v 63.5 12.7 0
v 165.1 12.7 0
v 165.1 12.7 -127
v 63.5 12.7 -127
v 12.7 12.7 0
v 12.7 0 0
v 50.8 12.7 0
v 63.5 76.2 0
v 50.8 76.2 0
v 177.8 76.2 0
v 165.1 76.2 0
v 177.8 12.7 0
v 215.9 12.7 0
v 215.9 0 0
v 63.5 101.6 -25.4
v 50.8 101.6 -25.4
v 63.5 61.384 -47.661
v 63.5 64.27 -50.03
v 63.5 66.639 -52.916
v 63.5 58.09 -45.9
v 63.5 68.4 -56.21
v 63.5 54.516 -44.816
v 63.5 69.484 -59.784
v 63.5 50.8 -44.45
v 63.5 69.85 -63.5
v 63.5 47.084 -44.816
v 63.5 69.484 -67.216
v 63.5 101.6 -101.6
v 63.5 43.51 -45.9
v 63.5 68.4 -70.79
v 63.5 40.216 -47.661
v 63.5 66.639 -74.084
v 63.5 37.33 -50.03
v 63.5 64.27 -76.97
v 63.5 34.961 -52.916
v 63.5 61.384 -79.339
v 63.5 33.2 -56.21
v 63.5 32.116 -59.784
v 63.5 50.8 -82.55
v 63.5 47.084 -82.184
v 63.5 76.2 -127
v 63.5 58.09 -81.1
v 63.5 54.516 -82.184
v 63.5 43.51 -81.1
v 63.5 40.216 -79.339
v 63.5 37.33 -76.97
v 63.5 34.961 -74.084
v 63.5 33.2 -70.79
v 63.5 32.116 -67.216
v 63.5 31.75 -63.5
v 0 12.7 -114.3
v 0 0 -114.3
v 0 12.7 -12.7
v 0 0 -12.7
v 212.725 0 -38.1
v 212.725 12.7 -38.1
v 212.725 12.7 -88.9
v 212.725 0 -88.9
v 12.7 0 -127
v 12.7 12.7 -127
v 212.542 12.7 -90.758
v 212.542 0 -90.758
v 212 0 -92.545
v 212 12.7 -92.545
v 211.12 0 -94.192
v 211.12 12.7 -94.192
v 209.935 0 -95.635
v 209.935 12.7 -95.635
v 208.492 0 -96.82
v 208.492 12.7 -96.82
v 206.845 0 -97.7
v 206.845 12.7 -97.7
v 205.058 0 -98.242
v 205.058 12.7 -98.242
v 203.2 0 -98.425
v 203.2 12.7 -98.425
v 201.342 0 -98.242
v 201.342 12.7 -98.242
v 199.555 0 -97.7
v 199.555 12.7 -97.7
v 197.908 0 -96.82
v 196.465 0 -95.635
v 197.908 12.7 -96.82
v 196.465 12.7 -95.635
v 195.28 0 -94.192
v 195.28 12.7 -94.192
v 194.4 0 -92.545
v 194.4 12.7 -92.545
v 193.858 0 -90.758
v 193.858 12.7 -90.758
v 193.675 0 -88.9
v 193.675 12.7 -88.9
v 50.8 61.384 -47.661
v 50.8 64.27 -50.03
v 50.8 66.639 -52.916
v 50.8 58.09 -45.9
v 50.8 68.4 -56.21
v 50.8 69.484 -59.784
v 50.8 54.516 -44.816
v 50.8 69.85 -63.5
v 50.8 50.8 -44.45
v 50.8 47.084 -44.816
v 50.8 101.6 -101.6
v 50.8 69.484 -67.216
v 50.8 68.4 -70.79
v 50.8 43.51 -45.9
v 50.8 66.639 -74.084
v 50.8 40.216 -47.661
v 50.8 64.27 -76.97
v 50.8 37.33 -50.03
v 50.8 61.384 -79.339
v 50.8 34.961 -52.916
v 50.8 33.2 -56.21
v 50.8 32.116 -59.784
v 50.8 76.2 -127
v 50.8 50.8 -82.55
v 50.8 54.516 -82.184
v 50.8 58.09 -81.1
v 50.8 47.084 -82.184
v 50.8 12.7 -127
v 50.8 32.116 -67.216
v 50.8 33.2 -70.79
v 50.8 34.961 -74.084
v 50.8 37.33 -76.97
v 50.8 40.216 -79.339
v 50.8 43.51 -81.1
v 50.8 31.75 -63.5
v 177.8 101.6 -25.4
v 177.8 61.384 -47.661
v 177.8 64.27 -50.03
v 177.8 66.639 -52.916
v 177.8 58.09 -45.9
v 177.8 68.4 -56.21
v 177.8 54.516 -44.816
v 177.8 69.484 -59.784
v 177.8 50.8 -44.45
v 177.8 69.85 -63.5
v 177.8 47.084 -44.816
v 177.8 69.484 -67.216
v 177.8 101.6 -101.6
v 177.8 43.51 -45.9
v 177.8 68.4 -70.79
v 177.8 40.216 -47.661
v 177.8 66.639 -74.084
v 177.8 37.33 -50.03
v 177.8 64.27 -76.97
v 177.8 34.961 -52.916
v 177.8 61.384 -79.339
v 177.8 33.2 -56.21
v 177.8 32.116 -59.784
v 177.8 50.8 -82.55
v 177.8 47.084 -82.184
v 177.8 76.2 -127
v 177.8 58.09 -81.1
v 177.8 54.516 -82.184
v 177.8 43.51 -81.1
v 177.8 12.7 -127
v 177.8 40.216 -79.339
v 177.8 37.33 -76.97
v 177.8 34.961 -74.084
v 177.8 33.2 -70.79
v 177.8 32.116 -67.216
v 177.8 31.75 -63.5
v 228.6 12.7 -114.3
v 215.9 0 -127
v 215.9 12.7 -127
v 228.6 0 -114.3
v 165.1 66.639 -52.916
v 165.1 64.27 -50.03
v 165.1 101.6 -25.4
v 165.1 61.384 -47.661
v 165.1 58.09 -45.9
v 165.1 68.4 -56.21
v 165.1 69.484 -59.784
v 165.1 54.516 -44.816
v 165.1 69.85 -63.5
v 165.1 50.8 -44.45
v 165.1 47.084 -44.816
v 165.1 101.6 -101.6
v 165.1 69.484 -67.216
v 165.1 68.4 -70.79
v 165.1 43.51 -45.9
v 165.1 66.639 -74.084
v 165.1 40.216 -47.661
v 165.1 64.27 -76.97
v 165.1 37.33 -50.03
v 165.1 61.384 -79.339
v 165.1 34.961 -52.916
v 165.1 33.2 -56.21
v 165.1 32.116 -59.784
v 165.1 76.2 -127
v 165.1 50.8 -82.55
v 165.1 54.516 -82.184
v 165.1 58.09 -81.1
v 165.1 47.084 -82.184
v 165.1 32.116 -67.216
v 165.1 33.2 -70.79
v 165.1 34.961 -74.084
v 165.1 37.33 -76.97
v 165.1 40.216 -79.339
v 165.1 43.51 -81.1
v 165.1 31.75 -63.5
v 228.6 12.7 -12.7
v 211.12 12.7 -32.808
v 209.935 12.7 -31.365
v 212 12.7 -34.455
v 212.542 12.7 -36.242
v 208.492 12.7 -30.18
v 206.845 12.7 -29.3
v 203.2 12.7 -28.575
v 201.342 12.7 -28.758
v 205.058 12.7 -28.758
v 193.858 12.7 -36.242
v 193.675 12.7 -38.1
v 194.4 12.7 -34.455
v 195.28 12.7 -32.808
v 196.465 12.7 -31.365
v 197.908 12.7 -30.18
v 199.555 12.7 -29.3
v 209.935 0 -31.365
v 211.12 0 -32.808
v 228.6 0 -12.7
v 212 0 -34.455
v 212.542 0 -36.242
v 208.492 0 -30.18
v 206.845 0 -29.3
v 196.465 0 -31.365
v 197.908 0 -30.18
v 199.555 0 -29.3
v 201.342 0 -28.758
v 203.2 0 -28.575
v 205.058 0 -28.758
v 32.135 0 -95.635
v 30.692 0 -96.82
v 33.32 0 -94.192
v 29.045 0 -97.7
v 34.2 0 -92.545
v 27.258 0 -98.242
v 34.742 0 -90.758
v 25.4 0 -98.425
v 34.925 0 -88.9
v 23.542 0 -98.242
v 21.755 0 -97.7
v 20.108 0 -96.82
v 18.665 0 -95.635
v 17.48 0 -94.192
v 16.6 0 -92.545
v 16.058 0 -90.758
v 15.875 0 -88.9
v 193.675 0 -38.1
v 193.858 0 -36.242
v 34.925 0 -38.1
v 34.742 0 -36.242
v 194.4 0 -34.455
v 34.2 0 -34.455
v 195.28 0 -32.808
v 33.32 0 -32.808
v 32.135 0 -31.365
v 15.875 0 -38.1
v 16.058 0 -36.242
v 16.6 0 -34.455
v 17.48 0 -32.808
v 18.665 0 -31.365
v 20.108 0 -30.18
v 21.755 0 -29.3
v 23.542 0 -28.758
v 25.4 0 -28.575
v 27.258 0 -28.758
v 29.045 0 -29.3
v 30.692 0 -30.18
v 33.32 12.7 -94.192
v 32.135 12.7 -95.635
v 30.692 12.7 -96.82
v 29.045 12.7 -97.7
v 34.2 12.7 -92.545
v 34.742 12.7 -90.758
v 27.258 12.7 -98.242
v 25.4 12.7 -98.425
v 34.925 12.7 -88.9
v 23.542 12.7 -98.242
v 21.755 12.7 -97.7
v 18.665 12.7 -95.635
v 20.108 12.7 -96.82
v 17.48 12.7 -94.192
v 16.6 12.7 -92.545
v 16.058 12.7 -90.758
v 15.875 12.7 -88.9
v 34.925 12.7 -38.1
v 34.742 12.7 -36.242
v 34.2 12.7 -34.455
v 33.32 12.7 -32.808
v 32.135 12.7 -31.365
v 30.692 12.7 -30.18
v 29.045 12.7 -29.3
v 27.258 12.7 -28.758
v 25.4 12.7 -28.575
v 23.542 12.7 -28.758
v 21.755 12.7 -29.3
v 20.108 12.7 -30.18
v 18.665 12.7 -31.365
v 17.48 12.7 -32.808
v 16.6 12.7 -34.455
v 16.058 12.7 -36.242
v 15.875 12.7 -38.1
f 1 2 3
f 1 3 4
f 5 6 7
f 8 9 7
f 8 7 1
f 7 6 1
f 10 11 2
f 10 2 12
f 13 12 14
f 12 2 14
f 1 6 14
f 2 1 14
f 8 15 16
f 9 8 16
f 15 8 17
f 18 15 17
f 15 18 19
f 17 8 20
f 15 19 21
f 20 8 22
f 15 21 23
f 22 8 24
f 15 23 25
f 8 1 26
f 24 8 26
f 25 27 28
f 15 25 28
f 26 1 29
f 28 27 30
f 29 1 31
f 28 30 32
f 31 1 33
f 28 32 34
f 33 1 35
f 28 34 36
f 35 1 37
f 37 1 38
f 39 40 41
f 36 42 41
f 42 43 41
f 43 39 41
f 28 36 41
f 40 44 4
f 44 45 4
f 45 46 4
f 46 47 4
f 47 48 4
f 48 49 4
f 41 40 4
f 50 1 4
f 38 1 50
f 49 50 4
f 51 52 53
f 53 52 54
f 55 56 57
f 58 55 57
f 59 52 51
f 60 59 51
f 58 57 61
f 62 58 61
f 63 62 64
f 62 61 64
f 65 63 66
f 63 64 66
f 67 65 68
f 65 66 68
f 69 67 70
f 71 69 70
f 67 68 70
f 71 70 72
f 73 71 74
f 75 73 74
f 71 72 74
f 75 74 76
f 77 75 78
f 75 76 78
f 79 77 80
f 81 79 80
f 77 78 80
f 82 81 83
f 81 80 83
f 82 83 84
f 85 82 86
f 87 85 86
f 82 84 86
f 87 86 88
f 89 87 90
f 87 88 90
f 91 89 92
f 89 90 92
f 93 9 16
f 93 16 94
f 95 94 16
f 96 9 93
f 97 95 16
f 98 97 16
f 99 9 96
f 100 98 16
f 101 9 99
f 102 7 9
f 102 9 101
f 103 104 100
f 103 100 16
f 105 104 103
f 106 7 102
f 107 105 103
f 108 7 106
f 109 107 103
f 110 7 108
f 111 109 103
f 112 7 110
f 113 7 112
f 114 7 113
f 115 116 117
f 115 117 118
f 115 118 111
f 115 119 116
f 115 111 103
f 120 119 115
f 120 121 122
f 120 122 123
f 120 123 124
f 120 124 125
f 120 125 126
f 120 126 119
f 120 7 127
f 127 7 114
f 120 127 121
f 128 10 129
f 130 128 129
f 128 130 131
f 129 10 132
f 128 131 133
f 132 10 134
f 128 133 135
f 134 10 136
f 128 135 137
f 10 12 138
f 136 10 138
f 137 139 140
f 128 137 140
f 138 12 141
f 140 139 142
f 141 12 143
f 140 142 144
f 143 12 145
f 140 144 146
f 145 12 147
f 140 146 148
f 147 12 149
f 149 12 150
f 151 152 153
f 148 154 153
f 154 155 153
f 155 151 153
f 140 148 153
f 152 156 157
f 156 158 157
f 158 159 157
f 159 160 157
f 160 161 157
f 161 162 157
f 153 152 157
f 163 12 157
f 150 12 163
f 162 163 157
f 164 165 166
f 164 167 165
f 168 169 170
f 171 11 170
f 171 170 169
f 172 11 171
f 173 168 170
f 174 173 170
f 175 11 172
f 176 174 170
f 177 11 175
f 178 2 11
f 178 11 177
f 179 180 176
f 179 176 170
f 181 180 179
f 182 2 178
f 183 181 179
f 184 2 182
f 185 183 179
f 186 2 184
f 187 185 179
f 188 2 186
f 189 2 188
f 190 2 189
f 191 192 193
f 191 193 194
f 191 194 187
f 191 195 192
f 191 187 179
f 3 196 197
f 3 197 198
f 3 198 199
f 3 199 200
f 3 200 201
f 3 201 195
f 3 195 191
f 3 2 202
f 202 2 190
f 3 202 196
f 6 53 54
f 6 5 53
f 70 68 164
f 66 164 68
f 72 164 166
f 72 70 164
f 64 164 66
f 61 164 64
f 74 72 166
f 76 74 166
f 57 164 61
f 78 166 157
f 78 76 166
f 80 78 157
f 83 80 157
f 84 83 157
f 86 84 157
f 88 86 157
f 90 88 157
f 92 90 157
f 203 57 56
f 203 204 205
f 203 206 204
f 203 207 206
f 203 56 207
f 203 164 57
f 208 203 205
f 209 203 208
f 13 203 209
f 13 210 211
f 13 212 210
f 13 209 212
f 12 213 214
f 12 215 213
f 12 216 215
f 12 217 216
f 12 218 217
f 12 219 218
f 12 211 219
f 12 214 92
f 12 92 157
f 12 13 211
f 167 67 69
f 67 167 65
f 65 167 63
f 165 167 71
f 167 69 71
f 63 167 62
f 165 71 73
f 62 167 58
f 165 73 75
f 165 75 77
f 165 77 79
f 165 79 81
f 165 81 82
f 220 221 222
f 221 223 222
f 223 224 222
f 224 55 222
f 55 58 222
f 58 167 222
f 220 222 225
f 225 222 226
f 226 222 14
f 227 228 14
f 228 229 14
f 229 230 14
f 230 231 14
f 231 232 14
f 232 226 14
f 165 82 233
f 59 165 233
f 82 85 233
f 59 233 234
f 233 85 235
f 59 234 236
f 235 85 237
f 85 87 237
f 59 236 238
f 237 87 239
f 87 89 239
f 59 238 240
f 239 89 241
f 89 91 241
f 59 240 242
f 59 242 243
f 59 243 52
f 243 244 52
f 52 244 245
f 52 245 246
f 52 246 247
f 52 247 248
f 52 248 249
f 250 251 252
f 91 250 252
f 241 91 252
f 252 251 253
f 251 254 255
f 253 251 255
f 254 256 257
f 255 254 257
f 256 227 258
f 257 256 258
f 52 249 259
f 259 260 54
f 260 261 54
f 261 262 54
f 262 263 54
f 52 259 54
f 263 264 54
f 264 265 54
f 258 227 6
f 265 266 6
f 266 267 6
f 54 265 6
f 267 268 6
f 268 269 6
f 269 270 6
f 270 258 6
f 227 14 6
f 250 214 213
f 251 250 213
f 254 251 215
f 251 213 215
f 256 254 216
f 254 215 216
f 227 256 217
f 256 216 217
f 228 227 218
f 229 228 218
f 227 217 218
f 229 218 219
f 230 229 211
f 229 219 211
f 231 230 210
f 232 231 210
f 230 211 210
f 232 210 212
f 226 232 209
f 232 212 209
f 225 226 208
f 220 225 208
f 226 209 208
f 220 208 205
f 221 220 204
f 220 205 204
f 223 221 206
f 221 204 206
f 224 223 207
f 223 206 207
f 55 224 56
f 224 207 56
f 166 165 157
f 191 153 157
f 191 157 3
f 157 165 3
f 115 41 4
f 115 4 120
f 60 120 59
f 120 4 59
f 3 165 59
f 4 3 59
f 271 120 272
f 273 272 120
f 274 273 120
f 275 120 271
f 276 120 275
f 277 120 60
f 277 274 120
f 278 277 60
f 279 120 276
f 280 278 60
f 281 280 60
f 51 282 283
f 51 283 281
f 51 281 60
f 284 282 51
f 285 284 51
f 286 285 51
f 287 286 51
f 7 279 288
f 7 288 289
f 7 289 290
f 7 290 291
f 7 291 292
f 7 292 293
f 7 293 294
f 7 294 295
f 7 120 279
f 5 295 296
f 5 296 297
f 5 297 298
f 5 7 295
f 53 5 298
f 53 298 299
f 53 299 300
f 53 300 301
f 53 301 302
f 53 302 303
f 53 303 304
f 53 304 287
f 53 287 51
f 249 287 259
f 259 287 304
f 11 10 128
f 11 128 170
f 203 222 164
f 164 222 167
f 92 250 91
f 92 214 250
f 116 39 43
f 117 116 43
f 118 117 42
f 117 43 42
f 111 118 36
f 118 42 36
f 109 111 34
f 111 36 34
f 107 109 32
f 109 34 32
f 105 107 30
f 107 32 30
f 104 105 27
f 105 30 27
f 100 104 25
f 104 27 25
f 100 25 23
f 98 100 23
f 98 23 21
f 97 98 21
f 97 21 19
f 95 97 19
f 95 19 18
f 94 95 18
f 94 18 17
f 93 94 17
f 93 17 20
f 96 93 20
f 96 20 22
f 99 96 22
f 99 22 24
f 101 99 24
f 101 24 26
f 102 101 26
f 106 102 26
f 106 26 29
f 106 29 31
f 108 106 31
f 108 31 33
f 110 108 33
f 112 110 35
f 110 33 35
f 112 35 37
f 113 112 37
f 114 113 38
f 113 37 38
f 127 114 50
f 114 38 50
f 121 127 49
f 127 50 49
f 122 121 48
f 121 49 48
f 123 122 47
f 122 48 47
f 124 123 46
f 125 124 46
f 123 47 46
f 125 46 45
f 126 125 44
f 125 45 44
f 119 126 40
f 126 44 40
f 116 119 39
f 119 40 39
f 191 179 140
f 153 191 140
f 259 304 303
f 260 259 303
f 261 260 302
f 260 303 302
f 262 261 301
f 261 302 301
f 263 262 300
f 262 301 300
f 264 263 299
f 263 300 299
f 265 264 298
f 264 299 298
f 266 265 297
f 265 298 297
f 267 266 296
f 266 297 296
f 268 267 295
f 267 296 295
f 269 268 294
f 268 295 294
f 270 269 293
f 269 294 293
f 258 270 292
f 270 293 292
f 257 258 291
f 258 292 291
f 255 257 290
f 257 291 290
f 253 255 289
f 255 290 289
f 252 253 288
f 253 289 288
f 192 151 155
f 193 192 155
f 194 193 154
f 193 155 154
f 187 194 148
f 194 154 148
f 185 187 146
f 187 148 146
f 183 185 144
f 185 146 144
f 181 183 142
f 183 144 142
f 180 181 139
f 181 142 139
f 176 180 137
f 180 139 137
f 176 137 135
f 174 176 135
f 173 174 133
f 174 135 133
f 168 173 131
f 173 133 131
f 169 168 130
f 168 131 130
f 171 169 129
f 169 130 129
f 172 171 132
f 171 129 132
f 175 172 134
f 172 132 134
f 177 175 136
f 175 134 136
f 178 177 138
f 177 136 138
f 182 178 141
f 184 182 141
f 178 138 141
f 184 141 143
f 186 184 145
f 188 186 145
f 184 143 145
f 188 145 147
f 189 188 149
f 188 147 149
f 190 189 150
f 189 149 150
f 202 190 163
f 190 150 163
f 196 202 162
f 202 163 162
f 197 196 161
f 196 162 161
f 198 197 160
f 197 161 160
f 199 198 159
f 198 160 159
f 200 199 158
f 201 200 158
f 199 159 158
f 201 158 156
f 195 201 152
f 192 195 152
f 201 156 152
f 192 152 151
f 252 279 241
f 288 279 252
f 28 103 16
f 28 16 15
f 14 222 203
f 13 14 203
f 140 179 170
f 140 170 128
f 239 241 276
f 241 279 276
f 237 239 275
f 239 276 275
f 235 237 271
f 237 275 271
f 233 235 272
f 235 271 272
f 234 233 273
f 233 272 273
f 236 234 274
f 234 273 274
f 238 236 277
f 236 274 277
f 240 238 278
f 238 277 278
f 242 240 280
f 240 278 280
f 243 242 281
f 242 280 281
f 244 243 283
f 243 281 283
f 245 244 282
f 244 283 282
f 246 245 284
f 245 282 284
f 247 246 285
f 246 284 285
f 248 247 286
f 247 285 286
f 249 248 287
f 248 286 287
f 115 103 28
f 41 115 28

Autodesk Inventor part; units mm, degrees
ref_plane "YZ Plane" through (0, 0, 0) normal (1, 0, 0) x (0, 1, 0)
ref_plane "XZ Plane" through (0, 0, 0) normal (0, 1, 0) x (-1, 0, 0)
sketch "Sketch1" plane through (0, 0, 0) normal (0, 1, 0) x (-1, 0, 0)
  line L0 (0, 0) -> (-228.6, 0)
  line L1 (-228.6, 0) -> (-228.6, -127)
  line L2 (-228.6, -127) -> (0, -127)
  line L3 (0, -127) -> (0, 0)
  dimension "d0" = 228.6
  dimension "d1" = 127
extrude "Extrusion1" add sketch "Sketch1" along normal blind 12.7
chamfer "Chamfer1" distance 12.7 angle 45 4 edges at (0, 6.35, 0) (228.6, 6.35, 0) (228.6, 6.35, -127) (0, 6.35, -127)
sketch "Sketch2" plane through (0, 12.7, 0) normal (0, 1, 0) x (1, 0, 0)
  line L0 (12.7, 0) -> (215.9, 0) projected
  line L1 (114.3, 0) -> (63.5, 0)
  line L2 (63.5, 0) -> (63.5, 127)
  line L3 (63.5, 127) -> (114.3, 127)
  line L4 (114.3, 127) -> (114.3, 0)
  line L5 (215.9, 127) -> (12.7, 127) projected
  line L6 (63.5, 0) -> (50.8, 0)
  line L7 (50.8, 0) -> (50.8, 127)
  line L8 (50.8, 127) -> (63.5, 127)
  line L9 (63.5, 127) -> (63.5, 0)
  line L10 (114.3, 0) -> (165.1, 0)
  line L11 (165.1, 0) -> (165.1, 127)
  line L12 (165.1, 127) -> (114.3, 127)
  line L13 (114.3, 127) -> (114.3, 0)
  line L14 (165.1, 0) -> (177.8, 0)
  line L15 (177.8, 0) -> (177.8, 127)
  line L16 (177.8, 127) -> (165.1, 127)
  line L17 (165.1, 127) -> (165.1, 0)
  point P0 (0, 0)
  dimension "d7" = 50.8
  dimension "d8" = 127
  dimension "d9" = 12.7
  dimension "d10" = 50.8
  dimension "d11" = 12.7
extrude "Extrusion2" add sketch "Sketch2" along normal blind 88.9 contours L7 L5 L2 L0 | L11 L5 L15 L0
chamfer "Chamfer2" distance 25.4 angle 45 4 edges at (57.15, 101.6, 0) (57.15, 101.6, -127) (171.45, 101.6, 0) (171.45, 101.6, -127)
sketch "Sketch3" plane through (177.8, 12.7, 0) normal (1, 0, 0) x (0, 0, -1)
  line L0 (0, 0) -> (0, 63.5) projected
  line L1 (127, 0) -> (127, 63.5) projected
  line L2 (101.6, 88.9) -> (25.4, 88.9) projected
  line L3 (63.5, 88.9) -> (63.5, 38.1)
  circle A0 centre (63.5, 38.1) radius 19.05
  point P0 (0, -12.7)
  dimension "d17" = 50.8
  dimension "d18" = 38.1
extrude "Extrusion3" cut sketch "Sketch3" against normal through all
sketch "Sketch6" plane through (0, 12.7, 0) normal (0, 1, 0) x (1, 0, 0)
  arc A0 (207.9625, 88.9) -> (198.4375, 88.9) centre (203.2, 88.9) ccw projected
  circle A1 centre (203.2, 88.9) radius 9.525
  arc A2 (198.4375, 38.1) -> (207.9625, 38.1) centre (203.2, 38.1) ccw projected
  circle A3 centre (203.2, 38.1) radius 9.525
  line L0 (193.675, 38.1) -> (193.675, 88.9)
  line L1 (212.725, 38.1) -> (212.725, 88.9)
  point P0 (0, 0)
  dimension "d31" = 19.05
  dimension "d32" = 19.05
extrude "Extrusion5" cut sketch "Sketch6" against normal blind 25.4
ref_plane "Work Plane1" through (114.3, 0, -114.3) normal (-1, 0, 0) x (0, 0, 1)
mirror "Mirror1" about plane through (114.3, 0, -114.3) normal (-1, 0, 0) of "Extrusion5"
properties part number "Block3" material "Aluminum 6061"
